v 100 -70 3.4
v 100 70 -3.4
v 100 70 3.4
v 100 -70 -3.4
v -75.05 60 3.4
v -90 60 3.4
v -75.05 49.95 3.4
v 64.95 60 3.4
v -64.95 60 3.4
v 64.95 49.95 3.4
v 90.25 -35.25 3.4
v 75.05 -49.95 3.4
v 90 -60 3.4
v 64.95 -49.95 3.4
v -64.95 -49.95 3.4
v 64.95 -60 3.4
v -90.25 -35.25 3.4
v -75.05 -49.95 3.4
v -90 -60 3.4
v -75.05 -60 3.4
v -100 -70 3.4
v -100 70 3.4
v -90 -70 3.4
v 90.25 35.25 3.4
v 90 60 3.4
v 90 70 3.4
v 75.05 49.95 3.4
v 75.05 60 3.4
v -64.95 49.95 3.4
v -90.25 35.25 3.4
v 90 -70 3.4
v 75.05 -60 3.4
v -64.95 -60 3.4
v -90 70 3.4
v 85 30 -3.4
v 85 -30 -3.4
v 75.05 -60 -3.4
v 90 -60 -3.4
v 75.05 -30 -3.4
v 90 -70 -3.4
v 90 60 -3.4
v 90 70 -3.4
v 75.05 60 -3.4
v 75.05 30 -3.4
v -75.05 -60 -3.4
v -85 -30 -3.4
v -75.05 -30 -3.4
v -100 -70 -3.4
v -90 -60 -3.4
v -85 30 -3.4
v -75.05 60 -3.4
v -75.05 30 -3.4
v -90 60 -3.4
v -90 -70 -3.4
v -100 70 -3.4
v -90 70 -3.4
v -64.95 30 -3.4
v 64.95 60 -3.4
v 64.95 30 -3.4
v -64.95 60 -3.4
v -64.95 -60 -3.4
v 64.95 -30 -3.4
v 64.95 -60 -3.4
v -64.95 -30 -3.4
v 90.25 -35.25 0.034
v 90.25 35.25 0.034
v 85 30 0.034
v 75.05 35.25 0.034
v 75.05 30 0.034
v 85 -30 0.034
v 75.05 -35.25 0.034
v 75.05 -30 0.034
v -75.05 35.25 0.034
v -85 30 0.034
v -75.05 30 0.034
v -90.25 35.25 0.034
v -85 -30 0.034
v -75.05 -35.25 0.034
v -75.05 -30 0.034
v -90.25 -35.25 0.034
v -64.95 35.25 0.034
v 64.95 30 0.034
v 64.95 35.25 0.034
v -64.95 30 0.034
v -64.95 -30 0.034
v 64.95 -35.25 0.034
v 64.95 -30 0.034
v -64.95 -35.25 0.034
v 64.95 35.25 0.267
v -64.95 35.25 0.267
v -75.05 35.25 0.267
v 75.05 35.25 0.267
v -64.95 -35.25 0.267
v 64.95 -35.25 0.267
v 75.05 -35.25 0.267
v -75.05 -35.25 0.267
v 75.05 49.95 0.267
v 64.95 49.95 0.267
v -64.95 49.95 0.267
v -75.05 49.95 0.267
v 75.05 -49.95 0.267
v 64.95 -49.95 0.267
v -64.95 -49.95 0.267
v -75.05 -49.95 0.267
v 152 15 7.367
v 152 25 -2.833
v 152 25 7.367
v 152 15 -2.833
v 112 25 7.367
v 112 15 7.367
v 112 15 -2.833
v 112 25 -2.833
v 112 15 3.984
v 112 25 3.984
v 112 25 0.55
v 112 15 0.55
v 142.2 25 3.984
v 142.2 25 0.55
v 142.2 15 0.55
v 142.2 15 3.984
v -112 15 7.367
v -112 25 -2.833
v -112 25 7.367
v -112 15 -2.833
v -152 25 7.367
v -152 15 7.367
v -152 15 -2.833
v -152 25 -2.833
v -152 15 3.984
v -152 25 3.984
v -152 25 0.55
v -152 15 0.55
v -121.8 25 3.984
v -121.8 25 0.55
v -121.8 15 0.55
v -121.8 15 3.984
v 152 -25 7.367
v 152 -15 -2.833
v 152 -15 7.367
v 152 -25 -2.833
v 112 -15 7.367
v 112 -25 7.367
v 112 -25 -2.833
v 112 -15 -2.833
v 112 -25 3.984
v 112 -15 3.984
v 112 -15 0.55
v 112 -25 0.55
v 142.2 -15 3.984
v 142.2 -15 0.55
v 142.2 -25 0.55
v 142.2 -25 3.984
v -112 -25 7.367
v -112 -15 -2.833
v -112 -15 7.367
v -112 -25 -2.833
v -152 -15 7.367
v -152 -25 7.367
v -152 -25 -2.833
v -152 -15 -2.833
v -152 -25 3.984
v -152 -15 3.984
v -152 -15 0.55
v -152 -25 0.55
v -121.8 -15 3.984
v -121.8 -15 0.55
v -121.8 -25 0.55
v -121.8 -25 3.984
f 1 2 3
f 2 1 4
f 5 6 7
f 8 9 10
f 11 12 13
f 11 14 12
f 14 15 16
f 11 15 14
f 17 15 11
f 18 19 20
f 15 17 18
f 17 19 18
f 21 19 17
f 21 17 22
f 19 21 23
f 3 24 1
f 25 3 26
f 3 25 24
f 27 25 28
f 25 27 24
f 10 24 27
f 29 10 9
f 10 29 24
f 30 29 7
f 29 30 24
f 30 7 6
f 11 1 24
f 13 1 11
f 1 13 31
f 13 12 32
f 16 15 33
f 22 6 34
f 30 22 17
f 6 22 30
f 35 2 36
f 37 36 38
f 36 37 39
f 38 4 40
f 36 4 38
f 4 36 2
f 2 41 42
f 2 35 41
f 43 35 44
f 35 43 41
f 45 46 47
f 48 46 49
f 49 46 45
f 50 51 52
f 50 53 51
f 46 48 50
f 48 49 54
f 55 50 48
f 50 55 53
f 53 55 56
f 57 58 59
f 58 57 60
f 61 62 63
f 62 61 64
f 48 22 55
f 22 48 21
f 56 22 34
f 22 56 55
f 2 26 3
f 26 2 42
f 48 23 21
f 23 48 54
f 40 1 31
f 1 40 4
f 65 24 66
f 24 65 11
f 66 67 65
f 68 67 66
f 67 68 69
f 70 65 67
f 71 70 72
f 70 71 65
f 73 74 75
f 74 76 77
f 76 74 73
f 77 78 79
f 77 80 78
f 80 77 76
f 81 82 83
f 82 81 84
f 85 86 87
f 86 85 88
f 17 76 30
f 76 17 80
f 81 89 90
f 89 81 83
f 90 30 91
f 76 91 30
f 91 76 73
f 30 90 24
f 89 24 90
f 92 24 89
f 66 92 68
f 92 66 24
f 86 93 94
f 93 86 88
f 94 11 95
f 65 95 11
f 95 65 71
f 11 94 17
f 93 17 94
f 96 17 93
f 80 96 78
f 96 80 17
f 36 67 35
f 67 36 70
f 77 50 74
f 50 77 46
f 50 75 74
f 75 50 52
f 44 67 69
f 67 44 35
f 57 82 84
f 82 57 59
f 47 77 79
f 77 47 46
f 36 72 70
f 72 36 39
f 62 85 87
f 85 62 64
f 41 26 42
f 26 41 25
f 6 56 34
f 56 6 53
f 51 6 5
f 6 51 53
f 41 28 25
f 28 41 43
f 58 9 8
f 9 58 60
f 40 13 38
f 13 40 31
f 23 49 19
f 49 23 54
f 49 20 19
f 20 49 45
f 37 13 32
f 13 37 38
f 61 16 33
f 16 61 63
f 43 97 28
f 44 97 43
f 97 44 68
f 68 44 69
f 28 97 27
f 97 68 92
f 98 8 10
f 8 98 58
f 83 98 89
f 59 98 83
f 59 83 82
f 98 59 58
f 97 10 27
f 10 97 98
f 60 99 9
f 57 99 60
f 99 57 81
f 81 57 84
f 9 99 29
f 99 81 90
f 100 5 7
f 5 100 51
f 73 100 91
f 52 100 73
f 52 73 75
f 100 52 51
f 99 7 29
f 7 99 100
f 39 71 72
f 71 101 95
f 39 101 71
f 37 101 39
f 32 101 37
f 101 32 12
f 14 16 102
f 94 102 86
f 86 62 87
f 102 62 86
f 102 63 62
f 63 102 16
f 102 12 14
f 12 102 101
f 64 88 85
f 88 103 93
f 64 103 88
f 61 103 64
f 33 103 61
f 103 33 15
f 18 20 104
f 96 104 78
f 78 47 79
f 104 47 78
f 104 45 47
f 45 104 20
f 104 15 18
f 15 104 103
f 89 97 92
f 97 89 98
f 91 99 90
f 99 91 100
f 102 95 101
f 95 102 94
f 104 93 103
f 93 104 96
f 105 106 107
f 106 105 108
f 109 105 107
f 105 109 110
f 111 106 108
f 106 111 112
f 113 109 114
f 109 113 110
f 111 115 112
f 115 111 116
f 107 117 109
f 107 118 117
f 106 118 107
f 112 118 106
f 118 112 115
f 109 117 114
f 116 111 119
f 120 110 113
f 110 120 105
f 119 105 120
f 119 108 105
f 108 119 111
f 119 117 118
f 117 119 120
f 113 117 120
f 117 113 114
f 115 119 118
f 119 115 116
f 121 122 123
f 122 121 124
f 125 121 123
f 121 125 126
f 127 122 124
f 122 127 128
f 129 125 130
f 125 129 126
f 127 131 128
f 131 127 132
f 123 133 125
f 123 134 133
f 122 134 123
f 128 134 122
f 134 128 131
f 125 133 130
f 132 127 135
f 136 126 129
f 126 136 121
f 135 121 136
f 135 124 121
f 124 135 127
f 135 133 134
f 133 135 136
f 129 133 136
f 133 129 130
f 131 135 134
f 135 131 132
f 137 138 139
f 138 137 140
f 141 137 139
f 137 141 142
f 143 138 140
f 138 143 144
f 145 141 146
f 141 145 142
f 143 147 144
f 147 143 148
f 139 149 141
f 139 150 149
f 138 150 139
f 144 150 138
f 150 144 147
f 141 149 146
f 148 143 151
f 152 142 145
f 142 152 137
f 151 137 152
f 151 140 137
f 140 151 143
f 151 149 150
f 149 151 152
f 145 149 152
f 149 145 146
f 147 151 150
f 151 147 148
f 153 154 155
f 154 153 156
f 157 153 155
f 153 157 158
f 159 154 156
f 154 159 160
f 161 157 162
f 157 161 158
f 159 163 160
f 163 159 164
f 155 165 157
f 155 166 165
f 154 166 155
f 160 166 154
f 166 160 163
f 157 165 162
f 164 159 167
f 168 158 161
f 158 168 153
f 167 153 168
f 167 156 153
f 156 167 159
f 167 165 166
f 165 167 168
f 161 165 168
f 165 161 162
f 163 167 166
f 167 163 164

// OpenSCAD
h1  = 3.4;
i_x = 180;
i_y = 70;

spielraum = 0.5;

b = 10;
a_x = i_x + b*2;
a_y = i_y + 70;
f = 1.01;
kl_x = b*4;
kl_y = b*2;

difference () {
    union () {
        cube([a_x, a_y, h1*2], true);
    }
    translate([0, 0, h1 - 0.666])
    cube([i_x + spielraum, i_y + spielraum, h1 + 2], true);

    translate([0, 0, 0])
    cube([i_x - b, i_y - b, h1 * 4], true);

    translate([0, i_y/2 + a_y/2 - b*1, 0])
    cube([i_x, i_y, h1*2.5], true);

    translate([0, -i_y/2 - a_y/2 + b*1, 0])
    cube([i_x, i_y, h1*2.5], true);

    // 
    translate([a_y/2, a_x/2 - kl_x/2 - 2.5 * b,  0 ])
    cube([f*b, f*b, f*b], true);

    translate([-a_y/2, a_x/2 - kl_x/2 - 2.5 * b,  0 ])
    cube([f*b, f*b, f*b], true);
 
    translate([a_y/2, -a_x/2 + kl_x/2 + 2.5 * b,  0 ])
    cube([f*b, f*b, f*b], true);
 
    translate([-a_y/2, -a_x/2 + kl_x/2 + 2.5 * b,  0 ])
    cube([f*b, f*b, f*b], true);
    // 

    translate([a_y/2, a_x/2 - kl_x/2 - 4 * b,  -h1/2])
    cube([f * b, f * kl_x - b,  f * h1*1 + spielraum], true);

    translate([-a_y/2, a_x/2 - kl_x/2 - 4 * b, -h1/2])
    cube([f * b, f * kl_x - b,  f * h1*1 + spielraum], true);

    translate([a_y/2, -a_x/2 + kl_x/2 + 4 * b, -h1/2])
    cube([f * b, f * kl_x - b,  f * h1*1 + spielraum], true);

    translate([-a_y/2, -a_x/2 + kl_x/2 + 4 * b, -h1/2])
    cube([f * b,,f * kl_x - b,  f * h1*1 + spielraum], true);


}

module klemme() {
    difference(){
        cube([kl_x, b, h1*3], true);
        translate([-b, 0, 0])
        cube([f * kl_x, f * b, f * h1*1], true);

    }
}

translate([a_x * 0.66, kl_y, h1/3*2])
klemme();
translate([-a_x * 0.66, kl_y, h1/3*2])
klemme();
translate([a_x * 0.66, -kl_y, h1/3*2])
klemme();
translate([-a_x * 0.66, -kl_y, h1/3*2])
klemme();
